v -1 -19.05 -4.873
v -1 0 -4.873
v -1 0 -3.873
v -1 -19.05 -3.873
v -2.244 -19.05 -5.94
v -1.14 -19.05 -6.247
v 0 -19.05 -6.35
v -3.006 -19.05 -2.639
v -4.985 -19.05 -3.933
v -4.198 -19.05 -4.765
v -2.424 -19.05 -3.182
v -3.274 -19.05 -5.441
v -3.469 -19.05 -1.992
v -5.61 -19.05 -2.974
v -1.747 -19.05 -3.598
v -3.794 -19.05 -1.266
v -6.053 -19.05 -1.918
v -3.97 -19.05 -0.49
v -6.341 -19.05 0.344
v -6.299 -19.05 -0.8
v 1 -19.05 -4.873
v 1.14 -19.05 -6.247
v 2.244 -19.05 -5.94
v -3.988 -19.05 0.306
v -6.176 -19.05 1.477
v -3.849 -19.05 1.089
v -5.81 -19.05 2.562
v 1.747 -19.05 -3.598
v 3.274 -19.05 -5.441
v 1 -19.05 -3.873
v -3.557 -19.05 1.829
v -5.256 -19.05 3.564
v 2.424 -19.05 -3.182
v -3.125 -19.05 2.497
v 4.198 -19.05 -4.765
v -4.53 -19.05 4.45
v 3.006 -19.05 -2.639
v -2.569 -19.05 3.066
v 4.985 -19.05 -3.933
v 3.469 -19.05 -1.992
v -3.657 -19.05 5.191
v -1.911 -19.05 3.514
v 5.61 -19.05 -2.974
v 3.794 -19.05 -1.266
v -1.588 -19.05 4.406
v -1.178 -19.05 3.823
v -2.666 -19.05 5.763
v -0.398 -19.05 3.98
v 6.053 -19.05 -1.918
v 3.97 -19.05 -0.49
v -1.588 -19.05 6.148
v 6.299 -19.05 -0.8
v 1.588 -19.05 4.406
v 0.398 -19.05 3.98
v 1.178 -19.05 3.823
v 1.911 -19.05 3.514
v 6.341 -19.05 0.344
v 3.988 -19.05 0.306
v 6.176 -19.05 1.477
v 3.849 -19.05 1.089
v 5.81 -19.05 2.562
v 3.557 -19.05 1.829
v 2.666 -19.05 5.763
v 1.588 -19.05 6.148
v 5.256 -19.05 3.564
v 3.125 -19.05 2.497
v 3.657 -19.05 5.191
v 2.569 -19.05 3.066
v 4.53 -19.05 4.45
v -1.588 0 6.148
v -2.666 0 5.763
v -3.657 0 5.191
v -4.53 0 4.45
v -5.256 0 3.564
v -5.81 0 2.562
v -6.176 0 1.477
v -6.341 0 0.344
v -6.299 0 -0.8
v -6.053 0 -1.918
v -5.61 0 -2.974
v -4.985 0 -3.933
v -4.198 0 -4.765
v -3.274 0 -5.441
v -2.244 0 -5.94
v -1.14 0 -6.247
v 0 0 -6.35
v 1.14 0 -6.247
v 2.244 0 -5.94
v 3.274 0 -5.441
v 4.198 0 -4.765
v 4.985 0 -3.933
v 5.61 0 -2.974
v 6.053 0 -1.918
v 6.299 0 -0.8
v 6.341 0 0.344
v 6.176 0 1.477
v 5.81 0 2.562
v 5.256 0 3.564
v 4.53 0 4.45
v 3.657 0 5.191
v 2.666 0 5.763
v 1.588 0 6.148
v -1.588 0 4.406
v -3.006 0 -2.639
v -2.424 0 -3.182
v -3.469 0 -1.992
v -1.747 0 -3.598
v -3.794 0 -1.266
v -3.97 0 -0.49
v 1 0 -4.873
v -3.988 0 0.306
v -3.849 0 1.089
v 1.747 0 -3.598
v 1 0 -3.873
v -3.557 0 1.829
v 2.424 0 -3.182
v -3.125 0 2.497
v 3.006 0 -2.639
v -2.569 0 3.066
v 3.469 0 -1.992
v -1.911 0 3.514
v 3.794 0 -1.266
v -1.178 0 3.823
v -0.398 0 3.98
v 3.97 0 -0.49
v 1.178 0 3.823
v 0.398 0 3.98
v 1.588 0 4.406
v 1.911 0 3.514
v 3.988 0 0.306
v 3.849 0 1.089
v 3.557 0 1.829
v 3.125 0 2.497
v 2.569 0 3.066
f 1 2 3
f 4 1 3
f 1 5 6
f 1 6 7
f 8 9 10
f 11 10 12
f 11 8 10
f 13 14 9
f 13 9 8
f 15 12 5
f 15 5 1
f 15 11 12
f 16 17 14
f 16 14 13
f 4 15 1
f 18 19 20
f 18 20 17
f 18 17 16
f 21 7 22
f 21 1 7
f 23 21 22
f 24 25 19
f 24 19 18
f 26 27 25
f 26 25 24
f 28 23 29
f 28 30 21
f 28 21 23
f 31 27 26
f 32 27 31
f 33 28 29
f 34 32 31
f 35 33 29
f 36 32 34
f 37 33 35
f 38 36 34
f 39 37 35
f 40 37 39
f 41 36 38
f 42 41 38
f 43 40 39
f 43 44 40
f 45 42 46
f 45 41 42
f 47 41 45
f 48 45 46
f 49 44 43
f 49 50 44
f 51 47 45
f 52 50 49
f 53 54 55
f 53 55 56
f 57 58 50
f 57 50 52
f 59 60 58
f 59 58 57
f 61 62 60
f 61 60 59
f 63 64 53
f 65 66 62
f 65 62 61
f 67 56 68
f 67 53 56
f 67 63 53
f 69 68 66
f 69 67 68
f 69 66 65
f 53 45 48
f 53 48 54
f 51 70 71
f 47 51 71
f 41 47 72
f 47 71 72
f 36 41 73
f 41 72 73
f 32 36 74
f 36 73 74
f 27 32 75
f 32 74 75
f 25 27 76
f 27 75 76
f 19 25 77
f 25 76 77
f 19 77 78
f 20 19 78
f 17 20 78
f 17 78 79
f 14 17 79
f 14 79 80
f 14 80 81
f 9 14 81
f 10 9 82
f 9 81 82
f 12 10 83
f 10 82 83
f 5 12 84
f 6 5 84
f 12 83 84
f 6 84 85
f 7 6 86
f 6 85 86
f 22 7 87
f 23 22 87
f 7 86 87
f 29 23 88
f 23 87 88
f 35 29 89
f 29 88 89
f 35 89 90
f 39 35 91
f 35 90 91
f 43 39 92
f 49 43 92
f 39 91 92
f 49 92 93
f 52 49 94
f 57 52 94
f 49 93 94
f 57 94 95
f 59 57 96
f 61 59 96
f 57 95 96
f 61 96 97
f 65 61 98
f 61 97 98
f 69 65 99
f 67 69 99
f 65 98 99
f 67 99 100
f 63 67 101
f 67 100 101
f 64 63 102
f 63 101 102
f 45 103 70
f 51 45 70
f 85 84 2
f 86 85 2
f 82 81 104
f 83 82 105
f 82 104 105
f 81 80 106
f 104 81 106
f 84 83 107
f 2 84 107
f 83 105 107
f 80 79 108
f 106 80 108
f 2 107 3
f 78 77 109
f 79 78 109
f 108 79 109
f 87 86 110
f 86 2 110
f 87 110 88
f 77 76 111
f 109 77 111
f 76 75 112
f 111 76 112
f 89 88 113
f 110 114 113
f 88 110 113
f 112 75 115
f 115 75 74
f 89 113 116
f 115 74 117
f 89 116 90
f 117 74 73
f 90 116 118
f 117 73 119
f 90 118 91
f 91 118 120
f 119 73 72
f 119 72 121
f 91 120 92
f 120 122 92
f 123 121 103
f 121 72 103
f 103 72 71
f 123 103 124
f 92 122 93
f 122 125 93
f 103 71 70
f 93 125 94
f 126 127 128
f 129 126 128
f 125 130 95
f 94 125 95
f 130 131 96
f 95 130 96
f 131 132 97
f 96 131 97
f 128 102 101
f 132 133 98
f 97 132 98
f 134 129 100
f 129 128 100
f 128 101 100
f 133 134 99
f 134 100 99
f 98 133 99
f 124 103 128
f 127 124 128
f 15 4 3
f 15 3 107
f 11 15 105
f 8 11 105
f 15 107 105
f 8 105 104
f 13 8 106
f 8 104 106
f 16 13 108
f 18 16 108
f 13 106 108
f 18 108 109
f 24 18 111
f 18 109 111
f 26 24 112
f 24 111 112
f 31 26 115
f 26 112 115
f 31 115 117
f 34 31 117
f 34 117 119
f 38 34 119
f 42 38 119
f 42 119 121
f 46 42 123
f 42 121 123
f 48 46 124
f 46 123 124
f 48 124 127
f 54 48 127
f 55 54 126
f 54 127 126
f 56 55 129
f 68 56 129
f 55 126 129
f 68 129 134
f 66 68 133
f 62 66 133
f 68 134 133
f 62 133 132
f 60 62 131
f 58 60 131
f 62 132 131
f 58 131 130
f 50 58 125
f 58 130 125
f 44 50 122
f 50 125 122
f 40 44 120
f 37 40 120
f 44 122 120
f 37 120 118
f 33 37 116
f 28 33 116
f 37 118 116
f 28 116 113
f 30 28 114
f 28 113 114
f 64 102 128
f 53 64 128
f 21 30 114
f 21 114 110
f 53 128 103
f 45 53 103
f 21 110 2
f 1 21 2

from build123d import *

# Parameters (mm, degrees)
F1_DEPTH = 19.05


with BuildPart() as f1:
    # F0 (on Front) → F1 (new body)
    with BuildSketch(Plane.XZ):
        with BuildLine():
            Line((-1.5875, 4.4064), (-1.5875, 6.148361))
            ThreePointArc((-1.5875, 6.148361), (0, -6.35), (1.5875, 6.148361))
            Line((1.5875, 6.148361), (1.5875, 4.4064))
            Line((1.5875, 4.4064), (-1.5875, 4.4064))
        make_face()
        with BuildLine():
            ThreePointArc((-1, -3.872983), (0, 4), (1, -3.872983))
            Line((1, -3.872983), (1, -4.872983))
            Line((1, -4.872983), (-1, -4.872983))
            Line((-1, -4.872983), (-1, -3.872983))
        make_face(mode=Mode.SUBTRACT)
    extrude(amount=F1_DEPTH)


solid = f1.part
